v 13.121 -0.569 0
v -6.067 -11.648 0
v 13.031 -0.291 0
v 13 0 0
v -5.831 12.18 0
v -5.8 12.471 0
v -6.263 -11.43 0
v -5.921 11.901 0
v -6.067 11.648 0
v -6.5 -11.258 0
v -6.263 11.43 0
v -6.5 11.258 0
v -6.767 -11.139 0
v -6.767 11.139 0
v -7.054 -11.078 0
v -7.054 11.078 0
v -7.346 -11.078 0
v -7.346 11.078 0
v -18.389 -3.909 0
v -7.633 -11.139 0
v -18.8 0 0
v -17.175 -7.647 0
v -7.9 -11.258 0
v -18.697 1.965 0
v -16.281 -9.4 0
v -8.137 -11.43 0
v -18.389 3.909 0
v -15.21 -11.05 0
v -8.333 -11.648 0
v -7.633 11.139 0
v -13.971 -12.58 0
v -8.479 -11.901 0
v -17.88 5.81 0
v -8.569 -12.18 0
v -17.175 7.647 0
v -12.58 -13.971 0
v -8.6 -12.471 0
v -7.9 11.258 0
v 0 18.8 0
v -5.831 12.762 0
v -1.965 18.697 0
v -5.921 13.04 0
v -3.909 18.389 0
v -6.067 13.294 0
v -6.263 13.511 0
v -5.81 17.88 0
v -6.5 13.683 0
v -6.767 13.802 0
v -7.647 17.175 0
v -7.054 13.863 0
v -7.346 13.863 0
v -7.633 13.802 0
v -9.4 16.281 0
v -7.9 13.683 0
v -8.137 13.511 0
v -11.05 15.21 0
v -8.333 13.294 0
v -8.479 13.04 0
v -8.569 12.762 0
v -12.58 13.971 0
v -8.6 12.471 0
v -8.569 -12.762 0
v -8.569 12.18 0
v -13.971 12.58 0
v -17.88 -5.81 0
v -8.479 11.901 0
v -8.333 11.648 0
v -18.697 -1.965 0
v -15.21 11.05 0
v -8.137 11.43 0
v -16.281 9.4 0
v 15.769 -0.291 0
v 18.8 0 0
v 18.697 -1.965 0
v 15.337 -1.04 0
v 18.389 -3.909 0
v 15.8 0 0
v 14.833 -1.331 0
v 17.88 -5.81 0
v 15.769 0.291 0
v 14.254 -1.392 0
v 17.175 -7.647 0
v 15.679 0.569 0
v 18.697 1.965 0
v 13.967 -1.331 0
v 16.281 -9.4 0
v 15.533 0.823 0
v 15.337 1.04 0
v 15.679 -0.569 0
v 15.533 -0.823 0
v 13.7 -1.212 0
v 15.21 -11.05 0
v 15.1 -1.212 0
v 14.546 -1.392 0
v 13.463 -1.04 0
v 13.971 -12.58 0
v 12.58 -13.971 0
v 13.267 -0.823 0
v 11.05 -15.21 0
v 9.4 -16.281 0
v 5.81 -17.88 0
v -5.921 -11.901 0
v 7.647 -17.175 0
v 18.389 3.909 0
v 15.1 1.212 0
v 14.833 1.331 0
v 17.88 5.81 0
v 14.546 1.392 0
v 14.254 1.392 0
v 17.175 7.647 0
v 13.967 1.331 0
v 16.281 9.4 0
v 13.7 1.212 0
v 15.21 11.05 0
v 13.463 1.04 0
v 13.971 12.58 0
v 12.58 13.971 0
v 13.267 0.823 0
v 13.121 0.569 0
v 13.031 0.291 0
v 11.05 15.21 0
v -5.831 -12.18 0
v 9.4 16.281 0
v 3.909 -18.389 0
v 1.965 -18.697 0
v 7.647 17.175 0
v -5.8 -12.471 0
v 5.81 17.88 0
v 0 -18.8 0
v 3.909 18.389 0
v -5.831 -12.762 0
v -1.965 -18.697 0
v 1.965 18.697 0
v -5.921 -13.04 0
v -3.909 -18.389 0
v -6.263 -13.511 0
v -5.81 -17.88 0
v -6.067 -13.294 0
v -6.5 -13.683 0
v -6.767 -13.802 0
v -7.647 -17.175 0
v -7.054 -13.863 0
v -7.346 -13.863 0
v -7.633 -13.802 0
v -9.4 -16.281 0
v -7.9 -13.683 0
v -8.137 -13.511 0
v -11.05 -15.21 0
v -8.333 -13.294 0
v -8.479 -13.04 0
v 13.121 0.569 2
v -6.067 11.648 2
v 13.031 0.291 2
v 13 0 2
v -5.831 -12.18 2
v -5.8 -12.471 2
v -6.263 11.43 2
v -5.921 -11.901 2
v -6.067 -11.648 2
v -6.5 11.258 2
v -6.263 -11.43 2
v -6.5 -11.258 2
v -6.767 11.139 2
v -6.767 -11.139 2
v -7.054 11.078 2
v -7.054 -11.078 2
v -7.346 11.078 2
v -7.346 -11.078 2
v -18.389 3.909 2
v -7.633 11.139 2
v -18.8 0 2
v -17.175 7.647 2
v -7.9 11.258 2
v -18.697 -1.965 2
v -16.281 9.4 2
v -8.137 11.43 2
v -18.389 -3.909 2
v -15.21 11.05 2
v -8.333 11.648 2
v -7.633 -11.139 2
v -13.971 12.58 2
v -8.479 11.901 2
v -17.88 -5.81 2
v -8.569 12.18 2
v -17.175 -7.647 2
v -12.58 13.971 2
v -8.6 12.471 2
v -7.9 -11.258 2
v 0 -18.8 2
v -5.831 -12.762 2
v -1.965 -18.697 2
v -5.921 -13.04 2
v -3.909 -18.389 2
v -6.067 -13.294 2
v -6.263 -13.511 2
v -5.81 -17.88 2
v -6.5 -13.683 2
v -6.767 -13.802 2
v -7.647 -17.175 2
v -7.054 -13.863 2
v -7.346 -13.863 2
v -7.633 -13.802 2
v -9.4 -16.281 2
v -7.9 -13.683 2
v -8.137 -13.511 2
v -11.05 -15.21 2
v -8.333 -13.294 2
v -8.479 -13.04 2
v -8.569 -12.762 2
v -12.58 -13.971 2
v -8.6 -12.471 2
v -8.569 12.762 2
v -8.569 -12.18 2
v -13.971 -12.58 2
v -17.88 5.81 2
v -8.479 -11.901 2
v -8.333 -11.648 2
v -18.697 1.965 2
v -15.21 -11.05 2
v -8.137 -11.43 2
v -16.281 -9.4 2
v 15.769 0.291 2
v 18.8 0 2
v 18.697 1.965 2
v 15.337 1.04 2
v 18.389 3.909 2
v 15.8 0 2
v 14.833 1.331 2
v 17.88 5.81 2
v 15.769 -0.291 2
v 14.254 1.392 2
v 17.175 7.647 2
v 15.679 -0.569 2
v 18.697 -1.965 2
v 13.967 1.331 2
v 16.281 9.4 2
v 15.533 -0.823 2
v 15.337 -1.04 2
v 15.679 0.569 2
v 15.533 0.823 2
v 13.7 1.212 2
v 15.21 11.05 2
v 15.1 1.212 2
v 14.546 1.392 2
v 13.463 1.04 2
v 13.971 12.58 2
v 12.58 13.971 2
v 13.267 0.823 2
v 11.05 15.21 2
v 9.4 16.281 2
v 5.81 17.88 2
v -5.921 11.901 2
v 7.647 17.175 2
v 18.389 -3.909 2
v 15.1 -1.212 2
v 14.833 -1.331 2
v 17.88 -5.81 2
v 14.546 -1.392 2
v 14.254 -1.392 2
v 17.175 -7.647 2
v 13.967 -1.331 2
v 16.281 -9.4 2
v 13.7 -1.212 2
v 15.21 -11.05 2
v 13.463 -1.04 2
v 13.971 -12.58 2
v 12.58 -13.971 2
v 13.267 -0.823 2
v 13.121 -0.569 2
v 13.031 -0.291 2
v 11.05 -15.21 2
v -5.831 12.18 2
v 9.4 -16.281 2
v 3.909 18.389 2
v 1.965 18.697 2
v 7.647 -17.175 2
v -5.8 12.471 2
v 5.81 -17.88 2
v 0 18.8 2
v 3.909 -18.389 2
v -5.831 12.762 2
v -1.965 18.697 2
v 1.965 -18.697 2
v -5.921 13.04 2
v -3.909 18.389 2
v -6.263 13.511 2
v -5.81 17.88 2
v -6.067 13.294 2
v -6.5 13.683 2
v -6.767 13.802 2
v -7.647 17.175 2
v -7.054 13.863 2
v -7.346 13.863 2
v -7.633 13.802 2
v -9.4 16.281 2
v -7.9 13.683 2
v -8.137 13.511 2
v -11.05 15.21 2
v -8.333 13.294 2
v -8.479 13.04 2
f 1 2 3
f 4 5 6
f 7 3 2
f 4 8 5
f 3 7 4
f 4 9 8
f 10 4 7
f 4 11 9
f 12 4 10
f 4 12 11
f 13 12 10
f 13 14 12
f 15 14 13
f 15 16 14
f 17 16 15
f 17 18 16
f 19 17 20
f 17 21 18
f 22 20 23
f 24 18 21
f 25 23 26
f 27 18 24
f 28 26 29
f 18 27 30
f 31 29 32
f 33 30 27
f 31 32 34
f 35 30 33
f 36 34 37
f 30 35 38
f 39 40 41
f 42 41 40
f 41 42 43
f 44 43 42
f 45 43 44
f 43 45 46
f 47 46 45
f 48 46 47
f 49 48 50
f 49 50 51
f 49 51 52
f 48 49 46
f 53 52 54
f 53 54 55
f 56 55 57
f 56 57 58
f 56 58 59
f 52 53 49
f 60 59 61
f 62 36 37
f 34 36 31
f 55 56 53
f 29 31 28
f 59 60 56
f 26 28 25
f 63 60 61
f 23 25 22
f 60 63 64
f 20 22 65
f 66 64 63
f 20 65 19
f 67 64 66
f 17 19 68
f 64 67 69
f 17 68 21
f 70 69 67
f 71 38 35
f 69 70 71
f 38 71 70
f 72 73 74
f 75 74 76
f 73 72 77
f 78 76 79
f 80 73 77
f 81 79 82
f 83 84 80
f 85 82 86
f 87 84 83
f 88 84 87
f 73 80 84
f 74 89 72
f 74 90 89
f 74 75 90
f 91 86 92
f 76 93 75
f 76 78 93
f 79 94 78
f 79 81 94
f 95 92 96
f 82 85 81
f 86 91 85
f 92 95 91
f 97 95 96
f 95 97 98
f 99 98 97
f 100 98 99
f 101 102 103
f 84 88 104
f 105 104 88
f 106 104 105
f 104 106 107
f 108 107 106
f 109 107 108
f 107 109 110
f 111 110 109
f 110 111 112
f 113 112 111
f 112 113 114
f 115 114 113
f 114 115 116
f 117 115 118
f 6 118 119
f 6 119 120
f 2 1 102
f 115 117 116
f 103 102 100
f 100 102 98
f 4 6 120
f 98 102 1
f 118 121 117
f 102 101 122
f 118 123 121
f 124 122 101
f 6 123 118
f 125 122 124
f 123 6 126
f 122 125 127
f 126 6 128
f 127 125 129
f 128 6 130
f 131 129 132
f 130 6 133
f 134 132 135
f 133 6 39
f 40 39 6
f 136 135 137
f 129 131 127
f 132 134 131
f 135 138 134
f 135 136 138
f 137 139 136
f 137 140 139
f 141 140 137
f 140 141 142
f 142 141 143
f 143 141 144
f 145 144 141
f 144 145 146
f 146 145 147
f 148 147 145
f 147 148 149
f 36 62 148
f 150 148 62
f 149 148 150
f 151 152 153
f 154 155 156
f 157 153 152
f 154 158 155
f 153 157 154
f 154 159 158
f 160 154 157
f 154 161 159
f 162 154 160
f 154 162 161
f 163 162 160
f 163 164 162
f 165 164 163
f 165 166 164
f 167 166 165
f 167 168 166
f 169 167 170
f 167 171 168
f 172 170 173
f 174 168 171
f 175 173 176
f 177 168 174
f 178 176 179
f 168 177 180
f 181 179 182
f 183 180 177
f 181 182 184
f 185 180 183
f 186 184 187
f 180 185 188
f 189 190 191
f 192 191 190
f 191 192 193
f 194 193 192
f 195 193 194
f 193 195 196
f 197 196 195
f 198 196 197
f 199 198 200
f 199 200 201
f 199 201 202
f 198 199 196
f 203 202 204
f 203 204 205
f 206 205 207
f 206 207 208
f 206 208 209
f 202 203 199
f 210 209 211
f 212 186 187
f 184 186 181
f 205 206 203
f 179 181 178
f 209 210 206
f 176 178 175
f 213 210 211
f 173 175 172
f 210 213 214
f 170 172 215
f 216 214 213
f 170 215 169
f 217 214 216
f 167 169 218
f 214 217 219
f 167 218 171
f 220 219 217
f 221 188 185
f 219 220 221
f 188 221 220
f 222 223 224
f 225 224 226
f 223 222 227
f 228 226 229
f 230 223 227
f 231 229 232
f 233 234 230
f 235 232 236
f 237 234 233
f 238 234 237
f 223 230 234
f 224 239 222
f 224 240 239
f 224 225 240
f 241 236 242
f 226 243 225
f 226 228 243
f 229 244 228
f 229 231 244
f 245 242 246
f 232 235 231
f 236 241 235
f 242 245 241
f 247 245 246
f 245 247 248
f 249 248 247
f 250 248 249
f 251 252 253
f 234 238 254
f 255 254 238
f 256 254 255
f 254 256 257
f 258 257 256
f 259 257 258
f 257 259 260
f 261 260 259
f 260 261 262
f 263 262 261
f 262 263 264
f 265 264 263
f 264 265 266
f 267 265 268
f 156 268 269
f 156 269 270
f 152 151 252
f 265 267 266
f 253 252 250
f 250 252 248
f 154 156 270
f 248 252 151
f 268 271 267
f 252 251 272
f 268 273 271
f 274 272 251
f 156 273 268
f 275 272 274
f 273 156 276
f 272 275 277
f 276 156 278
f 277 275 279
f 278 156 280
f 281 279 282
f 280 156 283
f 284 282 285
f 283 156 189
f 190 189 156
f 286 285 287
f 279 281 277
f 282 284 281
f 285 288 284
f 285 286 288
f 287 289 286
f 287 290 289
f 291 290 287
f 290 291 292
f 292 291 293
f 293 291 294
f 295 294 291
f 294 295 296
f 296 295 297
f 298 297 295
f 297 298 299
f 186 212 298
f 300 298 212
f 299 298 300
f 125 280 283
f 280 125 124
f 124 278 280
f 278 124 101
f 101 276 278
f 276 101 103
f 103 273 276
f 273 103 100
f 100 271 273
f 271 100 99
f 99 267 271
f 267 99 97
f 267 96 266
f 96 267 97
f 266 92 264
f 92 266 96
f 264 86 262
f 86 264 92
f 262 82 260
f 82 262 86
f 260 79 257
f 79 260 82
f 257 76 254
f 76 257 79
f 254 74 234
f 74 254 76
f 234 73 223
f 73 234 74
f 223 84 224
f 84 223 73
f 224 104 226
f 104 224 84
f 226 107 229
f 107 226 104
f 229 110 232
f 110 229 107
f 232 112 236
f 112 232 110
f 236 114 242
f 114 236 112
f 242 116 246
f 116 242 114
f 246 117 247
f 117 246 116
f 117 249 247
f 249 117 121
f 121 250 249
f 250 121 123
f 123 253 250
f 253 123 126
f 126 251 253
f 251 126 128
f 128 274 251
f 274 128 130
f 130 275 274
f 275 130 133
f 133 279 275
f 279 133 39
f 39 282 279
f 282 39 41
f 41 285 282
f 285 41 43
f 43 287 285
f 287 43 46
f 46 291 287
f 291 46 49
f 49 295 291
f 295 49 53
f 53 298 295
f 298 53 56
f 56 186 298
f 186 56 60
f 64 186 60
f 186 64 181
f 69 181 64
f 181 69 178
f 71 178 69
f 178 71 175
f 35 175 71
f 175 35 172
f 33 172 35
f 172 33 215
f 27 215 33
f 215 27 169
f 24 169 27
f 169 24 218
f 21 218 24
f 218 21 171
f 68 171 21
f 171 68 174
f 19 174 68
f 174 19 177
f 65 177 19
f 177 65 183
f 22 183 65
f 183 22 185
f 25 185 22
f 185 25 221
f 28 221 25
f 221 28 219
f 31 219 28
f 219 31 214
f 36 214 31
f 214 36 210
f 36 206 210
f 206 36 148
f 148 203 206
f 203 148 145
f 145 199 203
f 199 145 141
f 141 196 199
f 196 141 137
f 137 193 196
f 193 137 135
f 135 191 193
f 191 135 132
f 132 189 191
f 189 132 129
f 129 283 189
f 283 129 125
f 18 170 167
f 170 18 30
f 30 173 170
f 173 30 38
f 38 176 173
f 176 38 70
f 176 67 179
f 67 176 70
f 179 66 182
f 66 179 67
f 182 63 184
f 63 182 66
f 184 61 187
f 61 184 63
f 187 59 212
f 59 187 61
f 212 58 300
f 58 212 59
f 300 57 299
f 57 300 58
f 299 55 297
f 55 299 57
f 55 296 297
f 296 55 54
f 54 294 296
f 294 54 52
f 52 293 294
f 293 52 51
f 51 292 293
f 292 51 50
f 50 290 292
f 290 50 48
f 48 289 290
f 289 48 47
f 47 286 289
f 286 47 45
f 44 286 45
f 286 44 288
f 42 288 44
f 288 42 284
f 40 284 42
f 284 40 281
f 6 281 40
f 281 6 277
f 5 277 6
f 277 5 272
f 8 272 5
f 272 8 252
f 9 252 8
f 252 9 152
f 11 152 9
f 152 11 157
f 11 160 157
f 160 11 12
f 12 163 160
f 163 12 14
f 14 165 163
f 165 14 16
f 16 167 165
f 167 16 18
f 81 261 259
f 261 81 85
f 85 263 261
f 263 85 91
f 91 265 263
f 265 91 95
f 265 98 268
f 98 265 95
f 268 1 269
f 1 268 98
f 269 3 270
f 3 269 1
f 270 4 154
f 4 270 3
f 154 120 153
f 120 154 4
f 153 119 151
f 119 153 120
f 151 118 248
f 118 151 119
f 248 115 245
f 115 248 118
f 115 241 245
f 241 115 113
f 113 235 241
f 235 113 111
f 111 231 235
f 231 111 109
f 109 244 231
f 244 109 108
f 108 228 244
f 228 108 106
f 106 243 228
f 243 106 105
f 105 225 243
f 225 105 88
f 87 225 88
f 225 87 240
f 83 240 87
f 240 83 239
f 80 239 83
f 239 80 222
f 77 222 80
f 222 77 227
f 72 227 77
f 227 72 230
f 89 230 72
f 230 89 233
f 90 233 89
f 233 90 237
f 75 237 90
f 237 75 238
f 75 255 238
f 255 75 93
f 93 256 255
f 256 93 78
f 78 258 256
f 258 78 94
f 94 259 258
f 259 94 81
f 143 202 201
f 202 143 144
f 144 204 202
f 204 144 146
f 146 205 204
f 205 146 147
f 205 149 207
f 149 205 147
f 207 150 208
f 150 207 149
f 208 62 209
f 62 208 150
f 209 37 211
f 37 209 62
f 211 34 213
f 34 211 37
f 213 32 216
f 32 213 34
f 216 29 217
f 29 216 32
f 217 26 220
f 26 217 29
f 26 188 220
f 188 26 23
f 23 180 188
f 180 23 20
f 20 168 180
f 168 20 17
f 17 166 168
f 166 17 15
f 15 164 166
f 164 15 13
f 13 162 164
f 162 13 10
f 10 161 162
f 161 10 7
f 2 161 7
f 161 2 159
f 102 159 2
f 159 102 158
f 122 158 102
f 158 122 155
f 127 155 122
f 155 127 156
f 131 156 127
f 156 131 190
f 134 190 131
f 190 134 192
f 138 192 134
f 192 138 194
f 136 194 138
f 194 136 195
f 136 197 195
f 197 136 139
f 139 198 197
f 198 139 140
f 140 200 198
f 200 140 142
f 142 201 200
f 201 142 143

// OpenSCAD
// file: adapter_plate.scad
function screw_coords(d, r) = [cos(d)*r, sin(d)*r];
function calculate_outer_dia(inner_dia, spacing, screw_dia) = inner_dia + spacing*4 + screw_dia*2;
function calculate_inner_dia(outer_dia, spacing, screw_dia) = outer_dia - spacing*4 - screw_dia*2;

module adapter_plate(d=20, h=2, spacing=2, screw_dia=3,screw_num=3) {
    inner_dia = d;
    outer_dia = calculate_outer_dia(inner_dia, spacing, screw_dia);
    screw_angle = 360 / screw_num;
    screw_radius = inner_dia/2 + spacing + screw_dia/2;
    linear_extrude(h){
        difference() {
            circle(d=outer_dia, $fn=60);
            circle(d=inner_dia, $fn=60);
            if(screw_num > 0){
                for( i = [0 : screw_num-1] ){
                    translate(screw_coords(i*screw_angle, screw_radius)) circle(d=screw_dia, $fn=30);
                }
            }
        }
    }
}

module adapter_drill(d=20, h=20, spacing=2, screw_dia=3, screw_num=3, no_center=0) {
    inner_dia = d;
    outer_dia = calculate_outer_dia(inner_dia, spacing, screw_dia);
    screw_angle = 360 / screw_num;
    screw_radius = inner_dia/2 + spacing + screw_dia/2;
    linear_extrude(h) {
        if(no_center == 0){
            circle(d=inner_dia, $fn=30);
        }
        if(screw_num > 0){
            for( i = [0: screw_num-1] ){
                translate(screw_coords(i*screw_angle, screw_radius)) circle(d=screw_dia, $fn=30);
            }
        }
    }
}

module adapter_drill_od(d=20, h=20, spacing=2, screw_dia=3, screw_num=3, no_center=0) {
    inner_dia = calculate_inner_dia(d, spacing, screw_dia);
    outer_dia = d;
    screw_angle = 360 / screw_num;
    screw_radius = inner_dia/2 + spacing + screw_dia/2;
    linear_extrude(h) {
        if(no_center == 0){
            circle(d=inner_dia, $fn=30);
        }
        if(screw_num > 0){
            for( i = [0: screw_num-1] ){
                translate(screw_coords(i*screw_angle, screw_radius)) circle(d=screw_dia, $fn=30);
            }
        }
    }
}

d=3;
screw_num=2;
screw_dia=2;

//adapter_plate(d=d, screw_num=screw_num, screw_dia=screw_dia,spacing=3);
adapter_drill(d=d, spacing=3, screw_num=3, screw_dia=2);
//adapter_plate();
//adapter_drill_od(d=d, spacing=2, screw_dia=2);
//adapter_plate(d=d, spacing=3);

// upper: screw_num=4, screw_dia=2.8, d=20
// bottom: screw_num=4, screw_dia=2.8, d=20
// side: screw_num=2, d=6, screw_dia=1.8
// main file
use <adapter_plate.scad>;

// Adapter params
d=20; h=2; spacing=3; screw_dia=2.8; screw_num=3;

union(){
    adapter_plate(d=d, h=h, spacing=spacing, screw_dia=screw_dia, screw_num=screw_num);
    linear_extrude(h) circle(d=d+.5);
}
